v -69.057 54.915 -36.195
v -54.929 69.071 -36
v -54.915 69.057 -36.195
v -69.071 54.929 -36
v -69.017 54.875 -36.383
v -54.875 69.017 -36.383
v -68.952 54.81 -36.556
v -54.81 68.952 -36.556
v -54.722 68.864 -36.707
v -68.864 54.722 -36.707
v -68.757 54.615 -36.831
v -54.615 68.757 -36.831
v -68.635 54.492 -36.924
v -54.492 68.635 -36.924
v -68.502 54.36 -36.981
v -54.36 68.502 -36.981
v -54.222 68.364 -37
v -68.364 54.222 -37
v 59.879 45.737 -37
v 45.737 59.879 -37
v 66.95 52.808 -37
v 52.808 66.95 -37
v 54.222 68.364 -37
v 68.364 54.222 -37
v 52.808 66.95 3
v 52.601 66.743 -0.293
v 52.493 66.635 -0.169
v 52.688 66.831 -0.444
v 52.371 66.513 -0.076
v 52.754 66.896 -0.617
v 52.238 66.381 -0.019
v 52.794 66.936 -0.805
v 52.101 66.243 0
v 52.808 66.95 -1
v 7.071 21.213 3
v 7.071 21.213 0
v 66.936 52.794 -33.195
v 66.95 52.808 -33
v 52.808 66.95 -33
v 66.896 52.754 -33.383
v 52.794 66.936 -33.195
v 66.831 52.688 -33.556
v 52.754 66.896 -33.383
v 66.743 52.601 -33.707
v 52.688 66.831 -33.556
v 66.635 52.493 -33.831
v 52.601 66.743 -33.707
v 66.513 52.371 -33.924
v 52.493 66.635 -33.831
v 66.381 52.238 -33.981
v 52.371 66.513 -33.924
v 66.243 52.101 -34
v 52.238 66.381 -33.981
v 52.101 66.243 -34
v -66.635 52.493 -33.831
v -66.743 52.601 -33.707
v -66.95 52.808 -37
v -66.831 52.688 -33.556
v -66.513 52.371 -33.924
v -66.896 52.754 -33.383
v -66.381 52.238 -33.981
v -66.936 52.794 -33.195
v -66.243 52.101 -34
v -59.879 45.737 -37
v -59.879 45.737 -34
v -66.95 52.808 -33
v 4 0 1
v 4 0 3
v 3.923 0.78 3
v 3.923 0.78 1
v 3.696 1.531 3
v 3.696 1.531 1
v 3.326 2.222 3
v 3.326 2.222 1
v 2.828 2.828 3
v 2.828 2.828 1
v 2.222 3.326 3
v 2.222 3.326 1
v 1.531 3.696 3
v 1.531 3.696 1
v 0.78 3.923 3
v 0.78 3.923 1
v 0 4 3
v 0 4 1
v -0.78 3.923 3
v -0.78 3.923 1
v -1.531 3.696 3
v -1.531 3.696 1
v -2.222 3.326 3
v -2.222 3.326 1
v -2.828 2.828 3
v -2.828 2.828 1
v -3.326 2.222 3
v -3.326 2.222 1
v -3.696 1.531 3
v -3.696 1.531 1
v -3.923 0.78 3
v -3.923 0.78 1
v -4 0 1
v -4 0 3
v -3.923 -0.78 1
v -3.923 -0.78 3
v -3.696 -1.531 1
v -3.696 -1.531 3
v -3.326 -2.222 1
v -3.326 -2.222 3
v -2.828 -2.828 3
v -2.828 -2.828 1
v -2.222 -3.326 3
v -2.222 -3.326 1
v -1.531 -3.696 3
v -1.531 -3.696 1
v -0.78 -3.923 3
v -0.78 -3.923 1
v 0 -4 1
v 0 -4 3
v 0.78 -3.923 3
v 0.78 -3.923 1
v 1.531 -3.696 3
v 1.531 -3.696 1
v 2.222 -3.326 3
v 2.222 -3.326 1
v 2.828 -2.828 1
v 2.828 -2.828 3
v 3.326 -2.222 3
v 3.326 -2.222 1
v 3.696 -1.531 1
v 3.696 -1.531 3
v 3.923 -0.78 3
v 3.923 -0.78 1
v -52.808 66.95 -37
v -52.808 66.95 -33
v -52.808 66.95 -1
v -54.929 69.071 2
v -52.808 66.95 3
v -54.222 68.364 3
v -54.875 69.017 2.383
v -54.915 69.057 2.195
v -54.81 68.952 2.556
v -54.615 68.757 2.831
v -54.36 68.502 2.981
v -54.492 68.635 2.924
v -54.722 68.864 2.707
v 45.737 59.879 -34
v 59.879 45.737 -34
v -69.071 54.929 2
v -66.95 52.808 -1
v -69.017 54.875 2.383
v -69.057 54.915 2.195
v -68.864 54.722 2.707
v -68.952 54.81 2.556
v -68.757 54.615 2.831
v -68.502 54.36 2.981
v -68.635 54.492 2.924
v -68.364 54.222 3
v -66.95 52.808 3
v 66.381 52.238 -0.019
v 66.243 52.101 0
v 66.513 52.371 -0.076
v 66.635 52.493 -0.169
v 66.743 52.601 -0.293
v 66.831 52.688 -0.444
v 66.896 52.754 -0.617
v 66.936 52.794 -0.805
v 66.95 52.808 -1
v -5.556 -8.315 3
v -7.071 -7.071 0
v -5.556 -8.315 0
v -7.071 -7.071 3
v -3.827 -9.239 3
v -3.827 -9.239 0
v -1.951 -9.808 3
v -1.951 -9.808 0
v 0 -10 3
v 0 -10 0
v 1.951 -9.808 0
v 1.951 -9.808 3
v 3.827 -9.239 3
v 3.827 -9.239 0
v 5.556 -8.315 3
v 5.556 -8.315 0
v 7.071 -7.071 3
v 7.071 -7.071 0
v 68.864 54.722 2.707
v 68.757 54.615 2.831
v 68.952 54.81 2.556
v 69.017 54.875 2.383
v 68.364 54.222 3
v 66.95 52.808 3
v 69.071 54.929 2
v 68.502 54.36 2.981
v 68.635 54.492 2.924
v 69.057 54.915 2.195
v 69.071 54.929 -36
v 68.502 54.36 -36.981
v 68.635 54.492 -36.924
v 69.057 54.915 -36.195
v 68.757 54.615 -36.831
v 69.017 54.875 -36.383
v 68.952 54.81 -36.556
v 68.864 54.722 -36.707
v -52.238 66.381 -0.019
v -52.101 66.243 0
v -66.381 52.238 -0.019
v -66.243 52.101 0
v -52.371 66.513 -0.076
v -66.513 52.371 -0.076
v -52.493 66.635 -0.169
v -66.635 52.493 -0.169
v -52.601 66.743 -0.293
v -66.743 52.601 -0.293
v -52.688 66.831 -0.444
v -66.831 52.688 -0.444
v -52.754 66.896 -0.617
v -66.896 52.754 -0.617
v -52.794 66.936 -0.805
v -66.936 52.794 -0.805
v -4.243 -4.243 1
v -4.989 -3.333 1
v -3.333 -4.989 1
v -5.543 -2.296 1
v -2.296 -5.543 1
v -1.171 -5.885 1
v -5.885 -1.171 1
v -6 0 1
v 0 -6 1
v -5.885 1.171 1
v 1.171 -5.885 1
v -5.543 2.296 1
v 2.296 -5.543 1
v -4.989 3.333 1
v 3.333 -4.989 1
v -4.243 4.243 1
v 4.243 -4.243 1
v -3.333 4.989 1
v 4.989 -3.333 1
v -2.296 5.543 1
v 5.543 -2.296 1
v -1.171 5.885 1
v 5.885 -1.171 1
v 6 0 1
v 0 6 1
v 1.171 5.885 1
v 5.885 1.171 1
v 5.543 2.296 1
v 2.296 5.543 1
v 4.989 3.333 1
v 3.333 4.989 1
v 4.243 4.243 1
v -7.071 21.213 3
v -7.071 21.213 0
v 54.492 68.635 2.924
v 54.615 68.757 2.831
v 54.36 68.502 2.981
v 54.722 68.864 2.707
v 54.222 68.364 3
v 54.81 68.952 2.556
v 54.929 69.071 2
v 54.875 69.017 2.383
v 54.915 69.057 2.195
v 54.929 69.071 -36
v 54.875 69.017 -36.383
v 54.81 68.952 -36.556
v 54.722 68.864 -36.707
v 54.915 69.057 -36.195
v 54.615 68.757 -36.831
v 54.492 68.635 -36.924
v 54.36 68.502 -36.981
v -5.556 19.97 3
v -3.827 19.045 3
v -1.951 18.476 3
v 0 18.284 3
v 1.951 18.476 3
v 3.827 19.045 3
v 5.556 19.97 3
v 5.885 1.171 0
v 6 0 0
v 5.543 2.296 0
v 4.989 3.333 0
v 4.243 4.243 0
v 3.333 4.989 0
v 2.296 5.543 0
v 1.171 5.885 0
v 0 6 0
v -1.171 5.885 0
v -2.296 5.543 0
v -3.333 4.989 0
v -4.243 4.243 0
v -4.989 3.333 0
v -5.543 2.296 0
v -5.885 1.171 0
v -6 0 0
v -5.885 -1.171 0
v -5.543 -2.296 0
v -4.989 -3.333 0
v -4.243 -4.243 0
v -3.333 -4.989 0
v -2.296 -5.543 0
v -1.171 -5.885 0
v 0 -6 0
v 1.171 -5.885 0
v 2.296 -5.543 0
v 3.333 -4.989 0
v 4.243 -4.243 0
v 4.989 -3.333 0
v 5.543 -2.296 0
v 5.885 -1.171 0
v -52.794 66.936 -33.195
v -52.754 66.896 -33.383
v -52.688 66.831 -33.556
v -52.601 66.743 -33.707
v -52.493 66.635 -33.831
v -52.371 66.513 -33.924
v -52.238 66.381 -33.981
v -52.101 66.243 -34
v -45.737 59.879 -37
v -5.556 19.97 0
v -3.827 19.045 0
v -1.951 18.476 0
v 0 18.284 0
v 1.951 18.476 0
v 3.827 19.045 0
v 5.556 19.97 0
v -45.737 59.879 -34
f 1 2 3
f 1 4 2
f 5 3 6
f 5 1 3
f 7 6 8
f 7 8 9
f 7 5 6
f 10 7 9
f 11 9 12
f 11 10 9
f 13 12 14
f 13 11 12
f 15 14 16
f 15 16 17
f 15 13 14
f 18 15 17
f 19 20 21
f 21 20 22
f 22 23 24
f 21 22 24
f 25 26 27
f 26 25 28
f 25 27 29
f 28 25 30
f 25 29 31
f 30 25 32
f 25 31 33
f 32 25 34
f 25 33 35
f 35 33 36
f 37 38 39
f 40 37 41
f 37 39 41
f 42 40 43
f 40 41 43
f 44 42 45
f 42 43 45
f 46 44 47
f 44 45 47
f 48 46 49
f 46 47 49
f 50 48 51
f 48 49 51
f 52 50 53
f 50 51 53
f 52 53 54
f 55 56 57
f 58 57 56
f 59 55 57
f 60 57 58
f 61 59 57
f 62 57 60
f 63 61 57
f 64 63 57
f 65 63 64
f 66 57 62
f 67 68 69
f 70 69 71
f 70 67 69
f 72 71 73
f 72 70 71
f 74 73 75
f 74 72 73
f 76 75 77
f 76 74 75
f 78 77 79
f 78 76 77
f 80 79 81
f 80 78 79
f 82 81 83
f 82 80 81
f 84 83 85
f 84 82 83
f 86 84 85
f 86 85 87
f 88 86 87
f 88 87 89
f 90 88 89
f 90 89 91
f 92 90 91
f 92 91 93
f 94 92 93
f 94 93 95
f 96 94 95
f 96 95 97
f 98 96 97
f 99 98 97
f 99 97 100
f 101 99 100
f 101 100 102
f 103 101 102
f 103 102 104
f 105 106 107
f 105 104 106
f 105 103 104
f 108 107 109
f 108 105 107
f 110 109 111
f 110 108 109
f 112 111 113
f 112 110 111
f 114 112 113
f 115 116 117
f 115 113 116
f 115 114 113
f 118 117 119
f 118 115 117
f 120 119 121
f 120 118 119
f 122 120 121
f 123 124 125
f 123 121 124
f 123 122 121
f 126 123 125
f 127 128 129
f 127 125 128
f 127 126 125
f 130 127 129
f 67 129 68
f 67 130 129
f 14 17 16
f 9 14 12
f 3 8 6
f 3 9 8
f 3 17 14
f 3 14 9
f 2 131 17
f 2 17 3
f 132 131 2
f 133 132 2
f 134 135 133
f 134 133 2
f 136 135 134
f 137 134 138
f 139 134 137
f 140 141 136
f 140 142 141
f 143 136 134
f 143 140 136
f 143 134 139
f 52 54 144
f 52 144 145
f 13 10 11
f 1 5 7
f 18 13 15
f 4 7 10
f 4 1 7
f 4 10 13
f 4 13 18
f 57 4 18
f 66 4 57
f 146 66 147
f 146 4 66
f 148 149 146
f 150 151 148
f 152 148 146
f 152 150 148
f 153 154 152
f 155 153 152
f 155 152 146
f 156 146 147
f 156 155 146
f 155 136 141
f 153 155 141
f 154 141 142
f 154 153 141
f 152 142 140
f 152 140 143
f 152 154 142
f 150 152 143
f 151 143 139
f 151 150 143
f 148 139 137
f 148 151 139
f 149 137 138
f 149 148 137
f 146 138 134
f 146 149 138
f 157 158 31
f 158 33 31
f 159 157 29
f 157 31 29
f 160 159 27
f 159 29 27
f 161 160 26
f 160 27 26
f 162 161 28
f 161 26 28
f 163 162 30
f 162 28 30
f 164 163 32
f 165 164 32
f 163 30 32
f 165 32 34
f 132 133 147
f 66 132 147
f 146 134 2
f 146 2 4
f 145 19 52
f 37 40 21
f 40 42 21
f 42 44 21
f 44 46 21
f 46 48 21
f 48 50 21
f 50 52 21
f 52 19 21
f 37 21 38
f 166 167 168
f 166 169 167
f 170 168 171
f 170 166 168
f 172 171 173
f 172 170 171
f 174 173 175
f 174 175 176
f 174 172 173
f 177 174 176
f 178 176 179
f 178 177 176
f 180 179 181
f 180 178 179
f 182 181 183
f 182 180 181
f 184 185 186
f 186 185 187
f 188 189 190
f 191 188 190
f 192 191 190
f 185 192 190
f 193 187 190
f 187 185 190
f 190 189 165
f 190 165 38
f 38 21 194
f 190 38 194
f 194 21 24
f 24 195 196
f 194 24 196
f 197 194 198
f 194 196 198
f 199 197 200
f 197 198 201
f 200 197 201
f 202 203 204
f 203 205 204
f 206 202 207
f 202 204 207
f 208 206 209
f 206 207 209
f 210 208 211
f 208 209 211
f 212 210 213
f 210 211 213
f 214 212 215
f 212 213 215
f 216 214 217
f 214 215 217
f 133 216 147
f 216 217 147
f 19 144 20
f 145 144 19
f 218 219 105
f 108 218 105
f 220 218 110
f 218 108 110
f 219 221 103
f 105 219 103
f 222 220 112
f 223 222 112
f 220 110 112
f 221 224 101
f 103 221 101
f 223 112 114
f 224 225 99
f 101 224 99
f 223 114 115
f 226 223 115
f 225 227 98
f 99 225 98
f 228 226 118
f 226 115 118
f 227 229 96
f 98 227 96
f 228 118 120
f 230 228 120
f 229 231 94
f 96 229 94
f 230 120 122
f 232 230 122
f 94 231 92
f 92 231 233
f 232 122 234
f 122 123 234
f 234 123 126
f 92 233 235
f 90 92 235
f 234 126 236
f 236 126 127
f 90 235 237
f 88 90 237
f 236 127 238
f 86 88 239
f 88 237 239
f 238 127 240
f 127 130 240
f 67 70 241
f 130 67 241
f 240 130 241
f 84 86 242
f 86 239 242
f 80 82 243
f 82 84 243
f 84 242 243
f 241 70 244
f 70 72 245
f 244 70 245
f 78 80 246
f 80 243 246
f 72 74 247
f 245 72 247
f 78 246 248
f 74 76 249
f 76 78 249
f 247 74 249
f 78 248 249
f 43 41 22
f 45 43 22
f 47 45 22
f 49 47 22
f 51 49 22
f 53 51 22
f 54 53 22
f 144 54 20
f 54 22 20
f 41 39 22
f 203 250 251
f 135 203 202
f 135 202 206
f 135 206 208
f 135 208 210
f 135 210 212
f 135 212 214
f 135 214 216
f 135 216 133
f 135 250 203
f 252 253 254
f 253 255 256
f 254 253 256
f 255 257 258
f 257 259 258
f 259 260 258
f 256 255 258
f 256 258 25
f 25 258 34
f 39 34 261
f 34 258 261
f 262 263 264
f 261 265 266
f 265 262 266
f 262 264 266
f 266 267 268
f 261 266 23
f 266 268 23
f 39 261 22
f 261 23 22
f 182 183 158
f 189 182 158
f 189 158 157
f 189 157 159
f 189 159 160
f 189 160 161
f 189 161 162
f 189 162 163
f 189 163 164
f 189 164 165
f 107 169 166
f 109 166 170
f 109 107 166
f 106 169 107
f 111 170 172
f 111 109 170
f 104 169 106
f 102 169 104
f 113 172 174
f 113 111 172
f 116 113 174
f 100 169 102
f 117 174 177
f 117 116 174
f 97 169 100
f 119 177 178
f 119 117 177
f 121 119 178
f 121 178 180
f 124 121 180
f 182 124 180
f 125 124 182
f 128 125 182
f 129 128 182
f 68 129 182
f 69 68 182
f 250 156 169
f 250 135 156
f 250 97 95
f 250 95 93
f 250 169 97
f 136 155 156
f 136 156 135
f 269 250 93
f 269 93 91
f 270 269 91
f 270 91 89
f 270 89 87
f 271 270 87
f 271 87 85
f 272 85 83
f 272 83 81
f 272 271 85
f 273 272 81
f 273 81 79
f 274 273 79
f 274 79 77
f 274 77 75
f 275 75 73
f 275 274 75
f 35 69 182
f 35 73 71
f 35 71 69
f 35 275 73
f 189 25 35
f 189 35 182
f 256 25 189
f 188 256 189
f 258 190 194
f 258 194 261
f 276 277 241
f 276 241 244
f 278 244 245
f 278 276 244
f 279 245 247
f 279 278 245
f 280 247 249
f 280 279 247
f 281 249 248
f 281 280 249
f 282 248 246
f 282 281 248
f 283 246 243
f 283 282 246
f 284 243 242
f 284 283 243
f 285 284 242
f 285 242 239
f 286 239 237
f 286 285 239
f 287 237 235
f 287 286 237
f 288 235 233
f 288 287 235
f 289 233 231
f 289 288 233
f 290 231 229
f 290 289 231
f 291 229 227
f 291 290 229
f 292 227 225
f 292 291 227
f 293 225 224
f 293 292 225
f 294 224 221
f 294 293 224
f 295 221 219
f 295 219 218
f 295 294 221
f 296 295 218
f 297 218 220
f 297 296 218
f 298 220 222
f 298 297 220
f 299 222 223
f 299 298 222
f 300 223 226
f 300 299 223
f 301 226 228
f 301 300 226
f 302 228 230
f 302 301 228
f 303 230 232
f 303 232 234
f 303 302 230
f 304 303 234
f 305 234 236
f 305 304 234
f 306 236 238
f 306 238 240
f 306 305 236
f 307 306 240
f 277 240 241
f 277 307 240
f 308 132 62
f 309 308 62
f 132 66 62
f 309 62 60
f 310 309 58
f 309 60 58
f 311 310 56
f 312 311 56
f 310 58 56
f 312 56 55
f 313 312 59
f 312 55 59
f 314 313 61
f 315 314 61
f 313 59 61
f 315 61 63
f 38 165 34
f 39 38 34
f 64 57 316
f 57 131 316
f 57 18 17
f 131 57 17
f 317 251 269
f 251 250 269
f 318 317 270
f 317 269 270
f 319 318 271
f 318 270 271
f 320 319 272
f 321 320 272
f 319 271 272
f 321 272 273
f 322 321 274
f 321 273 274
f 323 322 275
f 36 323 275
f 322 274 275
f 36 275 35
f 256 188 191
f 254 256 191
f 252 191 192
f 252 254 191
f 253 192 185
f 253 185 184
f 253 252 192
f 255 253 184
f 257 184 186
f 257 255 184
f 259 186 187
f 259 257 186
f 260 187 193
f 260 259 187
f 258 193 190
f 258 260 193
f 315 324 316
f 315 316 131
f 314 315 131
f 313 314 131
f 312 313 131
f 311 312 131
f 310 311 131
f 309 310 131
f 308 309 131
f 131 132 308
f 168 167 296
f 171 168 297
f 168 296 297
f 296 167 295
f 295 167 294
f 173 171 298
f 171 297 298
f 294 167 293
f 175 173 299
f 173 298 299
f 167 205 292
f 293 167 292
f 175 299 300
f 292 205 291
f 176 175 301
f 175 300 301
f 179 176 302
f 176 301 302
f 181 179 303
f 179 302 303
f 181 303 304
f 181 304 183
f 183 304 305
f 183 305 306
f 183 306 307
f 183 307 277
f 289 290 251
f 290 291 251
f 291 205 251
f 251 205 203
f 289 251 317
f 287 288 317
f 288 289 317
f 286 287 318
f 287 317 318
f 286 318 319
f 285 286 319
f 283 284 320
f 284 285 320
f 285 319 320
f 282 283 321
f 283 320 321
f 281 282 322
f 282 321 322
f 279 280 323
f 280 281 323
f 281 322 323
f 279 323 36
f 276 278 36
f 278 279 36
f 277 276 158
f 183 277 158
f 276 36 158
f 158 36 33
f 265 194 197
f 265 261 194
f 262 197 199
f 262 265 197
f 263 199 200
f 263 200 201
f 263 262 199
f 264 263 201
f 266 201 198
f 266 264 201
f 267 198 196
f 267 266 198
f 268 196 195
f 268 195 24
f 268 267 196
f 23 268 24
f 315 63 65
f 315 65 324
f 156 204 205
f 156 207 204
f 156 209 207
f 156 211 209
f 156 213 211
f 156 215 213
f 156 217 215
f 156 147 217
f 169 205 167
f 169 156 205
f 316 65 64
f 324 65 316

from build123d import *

# Parameters (mm, degrees)
F0_R     = 6
F0_R_2   = 4
F1_DEPTH = 3
F2_DEPTH = 37
F3_DEPTH = 34
F4_DEPTH = 1
F5_DEPTH = 5000
F6_R     = 10
F7_R     = 1


with BuildPart() as f1:
    # F0 (on Top) → F1 (new body)
    with BuildSketch(Plane.XY):
        Polygon((0, 14.1421356237), (-45.7365440327, 59.8786796564), (-59.8786796564, 45.7365440327), (0, -14.1421356237), (59.8786796564, 45.7365440327), (45.7365440327, 59.8786796564), align=None)
        Circle(F0_R, mode=Mode.SUBTRACT)
        Polygon((-45.7365440327, 59.8786796564), (-52.8076118446, 66.9497474683), (-66.9497474683, 52.8076118446), (-59.8786796564, 45.7365440327), align=None)
        Polygon((52.8076118446, 66.9497474683), (45.7365440327, 59.8786796564), (59.8786796564, 45.7365440327), (66.9497474683, 52.8076118446), align=None)
        Circle(F0_R)
        Circle(F0_R_2, mode=Mode.SUBTRACT)
        Polygon((-52.8076118446, 66.9497474683), (-54.9289321881, 69.0710678119), (-69.0710678119, 54.9289321881), (-66.9497474683, 52.8076118446), align=None)
        Polygon((54.9289321881, 69.0710678119), (52.8076118446, 66.9497474683), (66.9497474683, 52.8076118446), (69.0710678119, 54.9289321881), align=None)
        Circle(F0_R_2)
    extrude(amount=F1_DEPTH)

    # F0 (on Top) → F2 (join)
    with BuildSketch(Plane.XY):
        Polygon((-52.8076118446, 66.9497474683), (-54.9289321881, 69.0710678119), (-69.0710678119, 54.9289321881), (-66.9497474683, 52.8076118446), align=None)
        Polygon((-45.7365440327, 59.8786796564), (-52.8076118446, 66.9497474683), (-66.9497474683, 52.8076118446), (-59.8786796564, 45.7365440327), align=None)
        Polygon((52.8076118446, 66.9497474683), (45.7365440327, 59.8786796564), (59.8786796564, 45.7365440327), (66.9497474683, 52.8076118446), align=None)
        Polygon((54.9289321881, 69.0710678119), (52.8076118446, 66.9497474683), (66.9497474683, 52.8076118446), (69.0710678119, 54.9289321881), align=None)
    extrude(amount=-F2_DEPTH)

    # F0 (on Top) → F3 (cut)
    with BuildSketch(Plane.XY):
        Polygon((-45.7365440327, 59.8786796564), (-52.8076118446, 66.9497474683), (-66.9497474683, 52.8076118446), (-59.8786796564, 45.7365440327), align=None)
        Polygon((52.8076118446, 66.9497474683), (45.7365440327, 59.8786796564), (59.8786796564, 45.7365440327), (66.9497474683, 52.8076118446), align=None)
    extrude(amount=-F3_DEPTH, mode=Mode.SUBTRACT)

    # F0 (on Top) → F4 (cut)
    with BuildSketch(Plane.XY):
        Circle(F0_R)
        Circle(F0_R_2, mode=Mode.SUBTRACT)
    extrude(amount=F4_DEPTH, mode=Mode.SUBTRACT)

    # F0 (on Top) → F5 (cut)
    with BuildSketch(Plane.XY):
        Circle(F0_R_2)
    extrude(amount=F5_DEPTH, mode=Mode.SUBTRACT)

    # F6
    f6_edges = [f1.edges().sort_by_distance(p)[0] for p in [
        (0, -14.142136, 1.5),
        (0, 14.142136, 1.5),
    ]]
    fillet(f6_edges, radius=F6_R)

    # F7
    f7_edges = [f1.edges().sort_by_distance(p)[0] for p in [
        (62, 62, 3),
        (59.87868, 59.87868, 0),
        (62, 62, -37),
        (59.87868, 59.87868, -34),
        (-62, 62, -37),
        (-62, 62, 3),
        (-59.87868, 59.87868, 0),
        (-59.87868, 59.87868, -34),
    ]]
    fillet(f7_edges, radius=F7_R)


solid = f1.part
